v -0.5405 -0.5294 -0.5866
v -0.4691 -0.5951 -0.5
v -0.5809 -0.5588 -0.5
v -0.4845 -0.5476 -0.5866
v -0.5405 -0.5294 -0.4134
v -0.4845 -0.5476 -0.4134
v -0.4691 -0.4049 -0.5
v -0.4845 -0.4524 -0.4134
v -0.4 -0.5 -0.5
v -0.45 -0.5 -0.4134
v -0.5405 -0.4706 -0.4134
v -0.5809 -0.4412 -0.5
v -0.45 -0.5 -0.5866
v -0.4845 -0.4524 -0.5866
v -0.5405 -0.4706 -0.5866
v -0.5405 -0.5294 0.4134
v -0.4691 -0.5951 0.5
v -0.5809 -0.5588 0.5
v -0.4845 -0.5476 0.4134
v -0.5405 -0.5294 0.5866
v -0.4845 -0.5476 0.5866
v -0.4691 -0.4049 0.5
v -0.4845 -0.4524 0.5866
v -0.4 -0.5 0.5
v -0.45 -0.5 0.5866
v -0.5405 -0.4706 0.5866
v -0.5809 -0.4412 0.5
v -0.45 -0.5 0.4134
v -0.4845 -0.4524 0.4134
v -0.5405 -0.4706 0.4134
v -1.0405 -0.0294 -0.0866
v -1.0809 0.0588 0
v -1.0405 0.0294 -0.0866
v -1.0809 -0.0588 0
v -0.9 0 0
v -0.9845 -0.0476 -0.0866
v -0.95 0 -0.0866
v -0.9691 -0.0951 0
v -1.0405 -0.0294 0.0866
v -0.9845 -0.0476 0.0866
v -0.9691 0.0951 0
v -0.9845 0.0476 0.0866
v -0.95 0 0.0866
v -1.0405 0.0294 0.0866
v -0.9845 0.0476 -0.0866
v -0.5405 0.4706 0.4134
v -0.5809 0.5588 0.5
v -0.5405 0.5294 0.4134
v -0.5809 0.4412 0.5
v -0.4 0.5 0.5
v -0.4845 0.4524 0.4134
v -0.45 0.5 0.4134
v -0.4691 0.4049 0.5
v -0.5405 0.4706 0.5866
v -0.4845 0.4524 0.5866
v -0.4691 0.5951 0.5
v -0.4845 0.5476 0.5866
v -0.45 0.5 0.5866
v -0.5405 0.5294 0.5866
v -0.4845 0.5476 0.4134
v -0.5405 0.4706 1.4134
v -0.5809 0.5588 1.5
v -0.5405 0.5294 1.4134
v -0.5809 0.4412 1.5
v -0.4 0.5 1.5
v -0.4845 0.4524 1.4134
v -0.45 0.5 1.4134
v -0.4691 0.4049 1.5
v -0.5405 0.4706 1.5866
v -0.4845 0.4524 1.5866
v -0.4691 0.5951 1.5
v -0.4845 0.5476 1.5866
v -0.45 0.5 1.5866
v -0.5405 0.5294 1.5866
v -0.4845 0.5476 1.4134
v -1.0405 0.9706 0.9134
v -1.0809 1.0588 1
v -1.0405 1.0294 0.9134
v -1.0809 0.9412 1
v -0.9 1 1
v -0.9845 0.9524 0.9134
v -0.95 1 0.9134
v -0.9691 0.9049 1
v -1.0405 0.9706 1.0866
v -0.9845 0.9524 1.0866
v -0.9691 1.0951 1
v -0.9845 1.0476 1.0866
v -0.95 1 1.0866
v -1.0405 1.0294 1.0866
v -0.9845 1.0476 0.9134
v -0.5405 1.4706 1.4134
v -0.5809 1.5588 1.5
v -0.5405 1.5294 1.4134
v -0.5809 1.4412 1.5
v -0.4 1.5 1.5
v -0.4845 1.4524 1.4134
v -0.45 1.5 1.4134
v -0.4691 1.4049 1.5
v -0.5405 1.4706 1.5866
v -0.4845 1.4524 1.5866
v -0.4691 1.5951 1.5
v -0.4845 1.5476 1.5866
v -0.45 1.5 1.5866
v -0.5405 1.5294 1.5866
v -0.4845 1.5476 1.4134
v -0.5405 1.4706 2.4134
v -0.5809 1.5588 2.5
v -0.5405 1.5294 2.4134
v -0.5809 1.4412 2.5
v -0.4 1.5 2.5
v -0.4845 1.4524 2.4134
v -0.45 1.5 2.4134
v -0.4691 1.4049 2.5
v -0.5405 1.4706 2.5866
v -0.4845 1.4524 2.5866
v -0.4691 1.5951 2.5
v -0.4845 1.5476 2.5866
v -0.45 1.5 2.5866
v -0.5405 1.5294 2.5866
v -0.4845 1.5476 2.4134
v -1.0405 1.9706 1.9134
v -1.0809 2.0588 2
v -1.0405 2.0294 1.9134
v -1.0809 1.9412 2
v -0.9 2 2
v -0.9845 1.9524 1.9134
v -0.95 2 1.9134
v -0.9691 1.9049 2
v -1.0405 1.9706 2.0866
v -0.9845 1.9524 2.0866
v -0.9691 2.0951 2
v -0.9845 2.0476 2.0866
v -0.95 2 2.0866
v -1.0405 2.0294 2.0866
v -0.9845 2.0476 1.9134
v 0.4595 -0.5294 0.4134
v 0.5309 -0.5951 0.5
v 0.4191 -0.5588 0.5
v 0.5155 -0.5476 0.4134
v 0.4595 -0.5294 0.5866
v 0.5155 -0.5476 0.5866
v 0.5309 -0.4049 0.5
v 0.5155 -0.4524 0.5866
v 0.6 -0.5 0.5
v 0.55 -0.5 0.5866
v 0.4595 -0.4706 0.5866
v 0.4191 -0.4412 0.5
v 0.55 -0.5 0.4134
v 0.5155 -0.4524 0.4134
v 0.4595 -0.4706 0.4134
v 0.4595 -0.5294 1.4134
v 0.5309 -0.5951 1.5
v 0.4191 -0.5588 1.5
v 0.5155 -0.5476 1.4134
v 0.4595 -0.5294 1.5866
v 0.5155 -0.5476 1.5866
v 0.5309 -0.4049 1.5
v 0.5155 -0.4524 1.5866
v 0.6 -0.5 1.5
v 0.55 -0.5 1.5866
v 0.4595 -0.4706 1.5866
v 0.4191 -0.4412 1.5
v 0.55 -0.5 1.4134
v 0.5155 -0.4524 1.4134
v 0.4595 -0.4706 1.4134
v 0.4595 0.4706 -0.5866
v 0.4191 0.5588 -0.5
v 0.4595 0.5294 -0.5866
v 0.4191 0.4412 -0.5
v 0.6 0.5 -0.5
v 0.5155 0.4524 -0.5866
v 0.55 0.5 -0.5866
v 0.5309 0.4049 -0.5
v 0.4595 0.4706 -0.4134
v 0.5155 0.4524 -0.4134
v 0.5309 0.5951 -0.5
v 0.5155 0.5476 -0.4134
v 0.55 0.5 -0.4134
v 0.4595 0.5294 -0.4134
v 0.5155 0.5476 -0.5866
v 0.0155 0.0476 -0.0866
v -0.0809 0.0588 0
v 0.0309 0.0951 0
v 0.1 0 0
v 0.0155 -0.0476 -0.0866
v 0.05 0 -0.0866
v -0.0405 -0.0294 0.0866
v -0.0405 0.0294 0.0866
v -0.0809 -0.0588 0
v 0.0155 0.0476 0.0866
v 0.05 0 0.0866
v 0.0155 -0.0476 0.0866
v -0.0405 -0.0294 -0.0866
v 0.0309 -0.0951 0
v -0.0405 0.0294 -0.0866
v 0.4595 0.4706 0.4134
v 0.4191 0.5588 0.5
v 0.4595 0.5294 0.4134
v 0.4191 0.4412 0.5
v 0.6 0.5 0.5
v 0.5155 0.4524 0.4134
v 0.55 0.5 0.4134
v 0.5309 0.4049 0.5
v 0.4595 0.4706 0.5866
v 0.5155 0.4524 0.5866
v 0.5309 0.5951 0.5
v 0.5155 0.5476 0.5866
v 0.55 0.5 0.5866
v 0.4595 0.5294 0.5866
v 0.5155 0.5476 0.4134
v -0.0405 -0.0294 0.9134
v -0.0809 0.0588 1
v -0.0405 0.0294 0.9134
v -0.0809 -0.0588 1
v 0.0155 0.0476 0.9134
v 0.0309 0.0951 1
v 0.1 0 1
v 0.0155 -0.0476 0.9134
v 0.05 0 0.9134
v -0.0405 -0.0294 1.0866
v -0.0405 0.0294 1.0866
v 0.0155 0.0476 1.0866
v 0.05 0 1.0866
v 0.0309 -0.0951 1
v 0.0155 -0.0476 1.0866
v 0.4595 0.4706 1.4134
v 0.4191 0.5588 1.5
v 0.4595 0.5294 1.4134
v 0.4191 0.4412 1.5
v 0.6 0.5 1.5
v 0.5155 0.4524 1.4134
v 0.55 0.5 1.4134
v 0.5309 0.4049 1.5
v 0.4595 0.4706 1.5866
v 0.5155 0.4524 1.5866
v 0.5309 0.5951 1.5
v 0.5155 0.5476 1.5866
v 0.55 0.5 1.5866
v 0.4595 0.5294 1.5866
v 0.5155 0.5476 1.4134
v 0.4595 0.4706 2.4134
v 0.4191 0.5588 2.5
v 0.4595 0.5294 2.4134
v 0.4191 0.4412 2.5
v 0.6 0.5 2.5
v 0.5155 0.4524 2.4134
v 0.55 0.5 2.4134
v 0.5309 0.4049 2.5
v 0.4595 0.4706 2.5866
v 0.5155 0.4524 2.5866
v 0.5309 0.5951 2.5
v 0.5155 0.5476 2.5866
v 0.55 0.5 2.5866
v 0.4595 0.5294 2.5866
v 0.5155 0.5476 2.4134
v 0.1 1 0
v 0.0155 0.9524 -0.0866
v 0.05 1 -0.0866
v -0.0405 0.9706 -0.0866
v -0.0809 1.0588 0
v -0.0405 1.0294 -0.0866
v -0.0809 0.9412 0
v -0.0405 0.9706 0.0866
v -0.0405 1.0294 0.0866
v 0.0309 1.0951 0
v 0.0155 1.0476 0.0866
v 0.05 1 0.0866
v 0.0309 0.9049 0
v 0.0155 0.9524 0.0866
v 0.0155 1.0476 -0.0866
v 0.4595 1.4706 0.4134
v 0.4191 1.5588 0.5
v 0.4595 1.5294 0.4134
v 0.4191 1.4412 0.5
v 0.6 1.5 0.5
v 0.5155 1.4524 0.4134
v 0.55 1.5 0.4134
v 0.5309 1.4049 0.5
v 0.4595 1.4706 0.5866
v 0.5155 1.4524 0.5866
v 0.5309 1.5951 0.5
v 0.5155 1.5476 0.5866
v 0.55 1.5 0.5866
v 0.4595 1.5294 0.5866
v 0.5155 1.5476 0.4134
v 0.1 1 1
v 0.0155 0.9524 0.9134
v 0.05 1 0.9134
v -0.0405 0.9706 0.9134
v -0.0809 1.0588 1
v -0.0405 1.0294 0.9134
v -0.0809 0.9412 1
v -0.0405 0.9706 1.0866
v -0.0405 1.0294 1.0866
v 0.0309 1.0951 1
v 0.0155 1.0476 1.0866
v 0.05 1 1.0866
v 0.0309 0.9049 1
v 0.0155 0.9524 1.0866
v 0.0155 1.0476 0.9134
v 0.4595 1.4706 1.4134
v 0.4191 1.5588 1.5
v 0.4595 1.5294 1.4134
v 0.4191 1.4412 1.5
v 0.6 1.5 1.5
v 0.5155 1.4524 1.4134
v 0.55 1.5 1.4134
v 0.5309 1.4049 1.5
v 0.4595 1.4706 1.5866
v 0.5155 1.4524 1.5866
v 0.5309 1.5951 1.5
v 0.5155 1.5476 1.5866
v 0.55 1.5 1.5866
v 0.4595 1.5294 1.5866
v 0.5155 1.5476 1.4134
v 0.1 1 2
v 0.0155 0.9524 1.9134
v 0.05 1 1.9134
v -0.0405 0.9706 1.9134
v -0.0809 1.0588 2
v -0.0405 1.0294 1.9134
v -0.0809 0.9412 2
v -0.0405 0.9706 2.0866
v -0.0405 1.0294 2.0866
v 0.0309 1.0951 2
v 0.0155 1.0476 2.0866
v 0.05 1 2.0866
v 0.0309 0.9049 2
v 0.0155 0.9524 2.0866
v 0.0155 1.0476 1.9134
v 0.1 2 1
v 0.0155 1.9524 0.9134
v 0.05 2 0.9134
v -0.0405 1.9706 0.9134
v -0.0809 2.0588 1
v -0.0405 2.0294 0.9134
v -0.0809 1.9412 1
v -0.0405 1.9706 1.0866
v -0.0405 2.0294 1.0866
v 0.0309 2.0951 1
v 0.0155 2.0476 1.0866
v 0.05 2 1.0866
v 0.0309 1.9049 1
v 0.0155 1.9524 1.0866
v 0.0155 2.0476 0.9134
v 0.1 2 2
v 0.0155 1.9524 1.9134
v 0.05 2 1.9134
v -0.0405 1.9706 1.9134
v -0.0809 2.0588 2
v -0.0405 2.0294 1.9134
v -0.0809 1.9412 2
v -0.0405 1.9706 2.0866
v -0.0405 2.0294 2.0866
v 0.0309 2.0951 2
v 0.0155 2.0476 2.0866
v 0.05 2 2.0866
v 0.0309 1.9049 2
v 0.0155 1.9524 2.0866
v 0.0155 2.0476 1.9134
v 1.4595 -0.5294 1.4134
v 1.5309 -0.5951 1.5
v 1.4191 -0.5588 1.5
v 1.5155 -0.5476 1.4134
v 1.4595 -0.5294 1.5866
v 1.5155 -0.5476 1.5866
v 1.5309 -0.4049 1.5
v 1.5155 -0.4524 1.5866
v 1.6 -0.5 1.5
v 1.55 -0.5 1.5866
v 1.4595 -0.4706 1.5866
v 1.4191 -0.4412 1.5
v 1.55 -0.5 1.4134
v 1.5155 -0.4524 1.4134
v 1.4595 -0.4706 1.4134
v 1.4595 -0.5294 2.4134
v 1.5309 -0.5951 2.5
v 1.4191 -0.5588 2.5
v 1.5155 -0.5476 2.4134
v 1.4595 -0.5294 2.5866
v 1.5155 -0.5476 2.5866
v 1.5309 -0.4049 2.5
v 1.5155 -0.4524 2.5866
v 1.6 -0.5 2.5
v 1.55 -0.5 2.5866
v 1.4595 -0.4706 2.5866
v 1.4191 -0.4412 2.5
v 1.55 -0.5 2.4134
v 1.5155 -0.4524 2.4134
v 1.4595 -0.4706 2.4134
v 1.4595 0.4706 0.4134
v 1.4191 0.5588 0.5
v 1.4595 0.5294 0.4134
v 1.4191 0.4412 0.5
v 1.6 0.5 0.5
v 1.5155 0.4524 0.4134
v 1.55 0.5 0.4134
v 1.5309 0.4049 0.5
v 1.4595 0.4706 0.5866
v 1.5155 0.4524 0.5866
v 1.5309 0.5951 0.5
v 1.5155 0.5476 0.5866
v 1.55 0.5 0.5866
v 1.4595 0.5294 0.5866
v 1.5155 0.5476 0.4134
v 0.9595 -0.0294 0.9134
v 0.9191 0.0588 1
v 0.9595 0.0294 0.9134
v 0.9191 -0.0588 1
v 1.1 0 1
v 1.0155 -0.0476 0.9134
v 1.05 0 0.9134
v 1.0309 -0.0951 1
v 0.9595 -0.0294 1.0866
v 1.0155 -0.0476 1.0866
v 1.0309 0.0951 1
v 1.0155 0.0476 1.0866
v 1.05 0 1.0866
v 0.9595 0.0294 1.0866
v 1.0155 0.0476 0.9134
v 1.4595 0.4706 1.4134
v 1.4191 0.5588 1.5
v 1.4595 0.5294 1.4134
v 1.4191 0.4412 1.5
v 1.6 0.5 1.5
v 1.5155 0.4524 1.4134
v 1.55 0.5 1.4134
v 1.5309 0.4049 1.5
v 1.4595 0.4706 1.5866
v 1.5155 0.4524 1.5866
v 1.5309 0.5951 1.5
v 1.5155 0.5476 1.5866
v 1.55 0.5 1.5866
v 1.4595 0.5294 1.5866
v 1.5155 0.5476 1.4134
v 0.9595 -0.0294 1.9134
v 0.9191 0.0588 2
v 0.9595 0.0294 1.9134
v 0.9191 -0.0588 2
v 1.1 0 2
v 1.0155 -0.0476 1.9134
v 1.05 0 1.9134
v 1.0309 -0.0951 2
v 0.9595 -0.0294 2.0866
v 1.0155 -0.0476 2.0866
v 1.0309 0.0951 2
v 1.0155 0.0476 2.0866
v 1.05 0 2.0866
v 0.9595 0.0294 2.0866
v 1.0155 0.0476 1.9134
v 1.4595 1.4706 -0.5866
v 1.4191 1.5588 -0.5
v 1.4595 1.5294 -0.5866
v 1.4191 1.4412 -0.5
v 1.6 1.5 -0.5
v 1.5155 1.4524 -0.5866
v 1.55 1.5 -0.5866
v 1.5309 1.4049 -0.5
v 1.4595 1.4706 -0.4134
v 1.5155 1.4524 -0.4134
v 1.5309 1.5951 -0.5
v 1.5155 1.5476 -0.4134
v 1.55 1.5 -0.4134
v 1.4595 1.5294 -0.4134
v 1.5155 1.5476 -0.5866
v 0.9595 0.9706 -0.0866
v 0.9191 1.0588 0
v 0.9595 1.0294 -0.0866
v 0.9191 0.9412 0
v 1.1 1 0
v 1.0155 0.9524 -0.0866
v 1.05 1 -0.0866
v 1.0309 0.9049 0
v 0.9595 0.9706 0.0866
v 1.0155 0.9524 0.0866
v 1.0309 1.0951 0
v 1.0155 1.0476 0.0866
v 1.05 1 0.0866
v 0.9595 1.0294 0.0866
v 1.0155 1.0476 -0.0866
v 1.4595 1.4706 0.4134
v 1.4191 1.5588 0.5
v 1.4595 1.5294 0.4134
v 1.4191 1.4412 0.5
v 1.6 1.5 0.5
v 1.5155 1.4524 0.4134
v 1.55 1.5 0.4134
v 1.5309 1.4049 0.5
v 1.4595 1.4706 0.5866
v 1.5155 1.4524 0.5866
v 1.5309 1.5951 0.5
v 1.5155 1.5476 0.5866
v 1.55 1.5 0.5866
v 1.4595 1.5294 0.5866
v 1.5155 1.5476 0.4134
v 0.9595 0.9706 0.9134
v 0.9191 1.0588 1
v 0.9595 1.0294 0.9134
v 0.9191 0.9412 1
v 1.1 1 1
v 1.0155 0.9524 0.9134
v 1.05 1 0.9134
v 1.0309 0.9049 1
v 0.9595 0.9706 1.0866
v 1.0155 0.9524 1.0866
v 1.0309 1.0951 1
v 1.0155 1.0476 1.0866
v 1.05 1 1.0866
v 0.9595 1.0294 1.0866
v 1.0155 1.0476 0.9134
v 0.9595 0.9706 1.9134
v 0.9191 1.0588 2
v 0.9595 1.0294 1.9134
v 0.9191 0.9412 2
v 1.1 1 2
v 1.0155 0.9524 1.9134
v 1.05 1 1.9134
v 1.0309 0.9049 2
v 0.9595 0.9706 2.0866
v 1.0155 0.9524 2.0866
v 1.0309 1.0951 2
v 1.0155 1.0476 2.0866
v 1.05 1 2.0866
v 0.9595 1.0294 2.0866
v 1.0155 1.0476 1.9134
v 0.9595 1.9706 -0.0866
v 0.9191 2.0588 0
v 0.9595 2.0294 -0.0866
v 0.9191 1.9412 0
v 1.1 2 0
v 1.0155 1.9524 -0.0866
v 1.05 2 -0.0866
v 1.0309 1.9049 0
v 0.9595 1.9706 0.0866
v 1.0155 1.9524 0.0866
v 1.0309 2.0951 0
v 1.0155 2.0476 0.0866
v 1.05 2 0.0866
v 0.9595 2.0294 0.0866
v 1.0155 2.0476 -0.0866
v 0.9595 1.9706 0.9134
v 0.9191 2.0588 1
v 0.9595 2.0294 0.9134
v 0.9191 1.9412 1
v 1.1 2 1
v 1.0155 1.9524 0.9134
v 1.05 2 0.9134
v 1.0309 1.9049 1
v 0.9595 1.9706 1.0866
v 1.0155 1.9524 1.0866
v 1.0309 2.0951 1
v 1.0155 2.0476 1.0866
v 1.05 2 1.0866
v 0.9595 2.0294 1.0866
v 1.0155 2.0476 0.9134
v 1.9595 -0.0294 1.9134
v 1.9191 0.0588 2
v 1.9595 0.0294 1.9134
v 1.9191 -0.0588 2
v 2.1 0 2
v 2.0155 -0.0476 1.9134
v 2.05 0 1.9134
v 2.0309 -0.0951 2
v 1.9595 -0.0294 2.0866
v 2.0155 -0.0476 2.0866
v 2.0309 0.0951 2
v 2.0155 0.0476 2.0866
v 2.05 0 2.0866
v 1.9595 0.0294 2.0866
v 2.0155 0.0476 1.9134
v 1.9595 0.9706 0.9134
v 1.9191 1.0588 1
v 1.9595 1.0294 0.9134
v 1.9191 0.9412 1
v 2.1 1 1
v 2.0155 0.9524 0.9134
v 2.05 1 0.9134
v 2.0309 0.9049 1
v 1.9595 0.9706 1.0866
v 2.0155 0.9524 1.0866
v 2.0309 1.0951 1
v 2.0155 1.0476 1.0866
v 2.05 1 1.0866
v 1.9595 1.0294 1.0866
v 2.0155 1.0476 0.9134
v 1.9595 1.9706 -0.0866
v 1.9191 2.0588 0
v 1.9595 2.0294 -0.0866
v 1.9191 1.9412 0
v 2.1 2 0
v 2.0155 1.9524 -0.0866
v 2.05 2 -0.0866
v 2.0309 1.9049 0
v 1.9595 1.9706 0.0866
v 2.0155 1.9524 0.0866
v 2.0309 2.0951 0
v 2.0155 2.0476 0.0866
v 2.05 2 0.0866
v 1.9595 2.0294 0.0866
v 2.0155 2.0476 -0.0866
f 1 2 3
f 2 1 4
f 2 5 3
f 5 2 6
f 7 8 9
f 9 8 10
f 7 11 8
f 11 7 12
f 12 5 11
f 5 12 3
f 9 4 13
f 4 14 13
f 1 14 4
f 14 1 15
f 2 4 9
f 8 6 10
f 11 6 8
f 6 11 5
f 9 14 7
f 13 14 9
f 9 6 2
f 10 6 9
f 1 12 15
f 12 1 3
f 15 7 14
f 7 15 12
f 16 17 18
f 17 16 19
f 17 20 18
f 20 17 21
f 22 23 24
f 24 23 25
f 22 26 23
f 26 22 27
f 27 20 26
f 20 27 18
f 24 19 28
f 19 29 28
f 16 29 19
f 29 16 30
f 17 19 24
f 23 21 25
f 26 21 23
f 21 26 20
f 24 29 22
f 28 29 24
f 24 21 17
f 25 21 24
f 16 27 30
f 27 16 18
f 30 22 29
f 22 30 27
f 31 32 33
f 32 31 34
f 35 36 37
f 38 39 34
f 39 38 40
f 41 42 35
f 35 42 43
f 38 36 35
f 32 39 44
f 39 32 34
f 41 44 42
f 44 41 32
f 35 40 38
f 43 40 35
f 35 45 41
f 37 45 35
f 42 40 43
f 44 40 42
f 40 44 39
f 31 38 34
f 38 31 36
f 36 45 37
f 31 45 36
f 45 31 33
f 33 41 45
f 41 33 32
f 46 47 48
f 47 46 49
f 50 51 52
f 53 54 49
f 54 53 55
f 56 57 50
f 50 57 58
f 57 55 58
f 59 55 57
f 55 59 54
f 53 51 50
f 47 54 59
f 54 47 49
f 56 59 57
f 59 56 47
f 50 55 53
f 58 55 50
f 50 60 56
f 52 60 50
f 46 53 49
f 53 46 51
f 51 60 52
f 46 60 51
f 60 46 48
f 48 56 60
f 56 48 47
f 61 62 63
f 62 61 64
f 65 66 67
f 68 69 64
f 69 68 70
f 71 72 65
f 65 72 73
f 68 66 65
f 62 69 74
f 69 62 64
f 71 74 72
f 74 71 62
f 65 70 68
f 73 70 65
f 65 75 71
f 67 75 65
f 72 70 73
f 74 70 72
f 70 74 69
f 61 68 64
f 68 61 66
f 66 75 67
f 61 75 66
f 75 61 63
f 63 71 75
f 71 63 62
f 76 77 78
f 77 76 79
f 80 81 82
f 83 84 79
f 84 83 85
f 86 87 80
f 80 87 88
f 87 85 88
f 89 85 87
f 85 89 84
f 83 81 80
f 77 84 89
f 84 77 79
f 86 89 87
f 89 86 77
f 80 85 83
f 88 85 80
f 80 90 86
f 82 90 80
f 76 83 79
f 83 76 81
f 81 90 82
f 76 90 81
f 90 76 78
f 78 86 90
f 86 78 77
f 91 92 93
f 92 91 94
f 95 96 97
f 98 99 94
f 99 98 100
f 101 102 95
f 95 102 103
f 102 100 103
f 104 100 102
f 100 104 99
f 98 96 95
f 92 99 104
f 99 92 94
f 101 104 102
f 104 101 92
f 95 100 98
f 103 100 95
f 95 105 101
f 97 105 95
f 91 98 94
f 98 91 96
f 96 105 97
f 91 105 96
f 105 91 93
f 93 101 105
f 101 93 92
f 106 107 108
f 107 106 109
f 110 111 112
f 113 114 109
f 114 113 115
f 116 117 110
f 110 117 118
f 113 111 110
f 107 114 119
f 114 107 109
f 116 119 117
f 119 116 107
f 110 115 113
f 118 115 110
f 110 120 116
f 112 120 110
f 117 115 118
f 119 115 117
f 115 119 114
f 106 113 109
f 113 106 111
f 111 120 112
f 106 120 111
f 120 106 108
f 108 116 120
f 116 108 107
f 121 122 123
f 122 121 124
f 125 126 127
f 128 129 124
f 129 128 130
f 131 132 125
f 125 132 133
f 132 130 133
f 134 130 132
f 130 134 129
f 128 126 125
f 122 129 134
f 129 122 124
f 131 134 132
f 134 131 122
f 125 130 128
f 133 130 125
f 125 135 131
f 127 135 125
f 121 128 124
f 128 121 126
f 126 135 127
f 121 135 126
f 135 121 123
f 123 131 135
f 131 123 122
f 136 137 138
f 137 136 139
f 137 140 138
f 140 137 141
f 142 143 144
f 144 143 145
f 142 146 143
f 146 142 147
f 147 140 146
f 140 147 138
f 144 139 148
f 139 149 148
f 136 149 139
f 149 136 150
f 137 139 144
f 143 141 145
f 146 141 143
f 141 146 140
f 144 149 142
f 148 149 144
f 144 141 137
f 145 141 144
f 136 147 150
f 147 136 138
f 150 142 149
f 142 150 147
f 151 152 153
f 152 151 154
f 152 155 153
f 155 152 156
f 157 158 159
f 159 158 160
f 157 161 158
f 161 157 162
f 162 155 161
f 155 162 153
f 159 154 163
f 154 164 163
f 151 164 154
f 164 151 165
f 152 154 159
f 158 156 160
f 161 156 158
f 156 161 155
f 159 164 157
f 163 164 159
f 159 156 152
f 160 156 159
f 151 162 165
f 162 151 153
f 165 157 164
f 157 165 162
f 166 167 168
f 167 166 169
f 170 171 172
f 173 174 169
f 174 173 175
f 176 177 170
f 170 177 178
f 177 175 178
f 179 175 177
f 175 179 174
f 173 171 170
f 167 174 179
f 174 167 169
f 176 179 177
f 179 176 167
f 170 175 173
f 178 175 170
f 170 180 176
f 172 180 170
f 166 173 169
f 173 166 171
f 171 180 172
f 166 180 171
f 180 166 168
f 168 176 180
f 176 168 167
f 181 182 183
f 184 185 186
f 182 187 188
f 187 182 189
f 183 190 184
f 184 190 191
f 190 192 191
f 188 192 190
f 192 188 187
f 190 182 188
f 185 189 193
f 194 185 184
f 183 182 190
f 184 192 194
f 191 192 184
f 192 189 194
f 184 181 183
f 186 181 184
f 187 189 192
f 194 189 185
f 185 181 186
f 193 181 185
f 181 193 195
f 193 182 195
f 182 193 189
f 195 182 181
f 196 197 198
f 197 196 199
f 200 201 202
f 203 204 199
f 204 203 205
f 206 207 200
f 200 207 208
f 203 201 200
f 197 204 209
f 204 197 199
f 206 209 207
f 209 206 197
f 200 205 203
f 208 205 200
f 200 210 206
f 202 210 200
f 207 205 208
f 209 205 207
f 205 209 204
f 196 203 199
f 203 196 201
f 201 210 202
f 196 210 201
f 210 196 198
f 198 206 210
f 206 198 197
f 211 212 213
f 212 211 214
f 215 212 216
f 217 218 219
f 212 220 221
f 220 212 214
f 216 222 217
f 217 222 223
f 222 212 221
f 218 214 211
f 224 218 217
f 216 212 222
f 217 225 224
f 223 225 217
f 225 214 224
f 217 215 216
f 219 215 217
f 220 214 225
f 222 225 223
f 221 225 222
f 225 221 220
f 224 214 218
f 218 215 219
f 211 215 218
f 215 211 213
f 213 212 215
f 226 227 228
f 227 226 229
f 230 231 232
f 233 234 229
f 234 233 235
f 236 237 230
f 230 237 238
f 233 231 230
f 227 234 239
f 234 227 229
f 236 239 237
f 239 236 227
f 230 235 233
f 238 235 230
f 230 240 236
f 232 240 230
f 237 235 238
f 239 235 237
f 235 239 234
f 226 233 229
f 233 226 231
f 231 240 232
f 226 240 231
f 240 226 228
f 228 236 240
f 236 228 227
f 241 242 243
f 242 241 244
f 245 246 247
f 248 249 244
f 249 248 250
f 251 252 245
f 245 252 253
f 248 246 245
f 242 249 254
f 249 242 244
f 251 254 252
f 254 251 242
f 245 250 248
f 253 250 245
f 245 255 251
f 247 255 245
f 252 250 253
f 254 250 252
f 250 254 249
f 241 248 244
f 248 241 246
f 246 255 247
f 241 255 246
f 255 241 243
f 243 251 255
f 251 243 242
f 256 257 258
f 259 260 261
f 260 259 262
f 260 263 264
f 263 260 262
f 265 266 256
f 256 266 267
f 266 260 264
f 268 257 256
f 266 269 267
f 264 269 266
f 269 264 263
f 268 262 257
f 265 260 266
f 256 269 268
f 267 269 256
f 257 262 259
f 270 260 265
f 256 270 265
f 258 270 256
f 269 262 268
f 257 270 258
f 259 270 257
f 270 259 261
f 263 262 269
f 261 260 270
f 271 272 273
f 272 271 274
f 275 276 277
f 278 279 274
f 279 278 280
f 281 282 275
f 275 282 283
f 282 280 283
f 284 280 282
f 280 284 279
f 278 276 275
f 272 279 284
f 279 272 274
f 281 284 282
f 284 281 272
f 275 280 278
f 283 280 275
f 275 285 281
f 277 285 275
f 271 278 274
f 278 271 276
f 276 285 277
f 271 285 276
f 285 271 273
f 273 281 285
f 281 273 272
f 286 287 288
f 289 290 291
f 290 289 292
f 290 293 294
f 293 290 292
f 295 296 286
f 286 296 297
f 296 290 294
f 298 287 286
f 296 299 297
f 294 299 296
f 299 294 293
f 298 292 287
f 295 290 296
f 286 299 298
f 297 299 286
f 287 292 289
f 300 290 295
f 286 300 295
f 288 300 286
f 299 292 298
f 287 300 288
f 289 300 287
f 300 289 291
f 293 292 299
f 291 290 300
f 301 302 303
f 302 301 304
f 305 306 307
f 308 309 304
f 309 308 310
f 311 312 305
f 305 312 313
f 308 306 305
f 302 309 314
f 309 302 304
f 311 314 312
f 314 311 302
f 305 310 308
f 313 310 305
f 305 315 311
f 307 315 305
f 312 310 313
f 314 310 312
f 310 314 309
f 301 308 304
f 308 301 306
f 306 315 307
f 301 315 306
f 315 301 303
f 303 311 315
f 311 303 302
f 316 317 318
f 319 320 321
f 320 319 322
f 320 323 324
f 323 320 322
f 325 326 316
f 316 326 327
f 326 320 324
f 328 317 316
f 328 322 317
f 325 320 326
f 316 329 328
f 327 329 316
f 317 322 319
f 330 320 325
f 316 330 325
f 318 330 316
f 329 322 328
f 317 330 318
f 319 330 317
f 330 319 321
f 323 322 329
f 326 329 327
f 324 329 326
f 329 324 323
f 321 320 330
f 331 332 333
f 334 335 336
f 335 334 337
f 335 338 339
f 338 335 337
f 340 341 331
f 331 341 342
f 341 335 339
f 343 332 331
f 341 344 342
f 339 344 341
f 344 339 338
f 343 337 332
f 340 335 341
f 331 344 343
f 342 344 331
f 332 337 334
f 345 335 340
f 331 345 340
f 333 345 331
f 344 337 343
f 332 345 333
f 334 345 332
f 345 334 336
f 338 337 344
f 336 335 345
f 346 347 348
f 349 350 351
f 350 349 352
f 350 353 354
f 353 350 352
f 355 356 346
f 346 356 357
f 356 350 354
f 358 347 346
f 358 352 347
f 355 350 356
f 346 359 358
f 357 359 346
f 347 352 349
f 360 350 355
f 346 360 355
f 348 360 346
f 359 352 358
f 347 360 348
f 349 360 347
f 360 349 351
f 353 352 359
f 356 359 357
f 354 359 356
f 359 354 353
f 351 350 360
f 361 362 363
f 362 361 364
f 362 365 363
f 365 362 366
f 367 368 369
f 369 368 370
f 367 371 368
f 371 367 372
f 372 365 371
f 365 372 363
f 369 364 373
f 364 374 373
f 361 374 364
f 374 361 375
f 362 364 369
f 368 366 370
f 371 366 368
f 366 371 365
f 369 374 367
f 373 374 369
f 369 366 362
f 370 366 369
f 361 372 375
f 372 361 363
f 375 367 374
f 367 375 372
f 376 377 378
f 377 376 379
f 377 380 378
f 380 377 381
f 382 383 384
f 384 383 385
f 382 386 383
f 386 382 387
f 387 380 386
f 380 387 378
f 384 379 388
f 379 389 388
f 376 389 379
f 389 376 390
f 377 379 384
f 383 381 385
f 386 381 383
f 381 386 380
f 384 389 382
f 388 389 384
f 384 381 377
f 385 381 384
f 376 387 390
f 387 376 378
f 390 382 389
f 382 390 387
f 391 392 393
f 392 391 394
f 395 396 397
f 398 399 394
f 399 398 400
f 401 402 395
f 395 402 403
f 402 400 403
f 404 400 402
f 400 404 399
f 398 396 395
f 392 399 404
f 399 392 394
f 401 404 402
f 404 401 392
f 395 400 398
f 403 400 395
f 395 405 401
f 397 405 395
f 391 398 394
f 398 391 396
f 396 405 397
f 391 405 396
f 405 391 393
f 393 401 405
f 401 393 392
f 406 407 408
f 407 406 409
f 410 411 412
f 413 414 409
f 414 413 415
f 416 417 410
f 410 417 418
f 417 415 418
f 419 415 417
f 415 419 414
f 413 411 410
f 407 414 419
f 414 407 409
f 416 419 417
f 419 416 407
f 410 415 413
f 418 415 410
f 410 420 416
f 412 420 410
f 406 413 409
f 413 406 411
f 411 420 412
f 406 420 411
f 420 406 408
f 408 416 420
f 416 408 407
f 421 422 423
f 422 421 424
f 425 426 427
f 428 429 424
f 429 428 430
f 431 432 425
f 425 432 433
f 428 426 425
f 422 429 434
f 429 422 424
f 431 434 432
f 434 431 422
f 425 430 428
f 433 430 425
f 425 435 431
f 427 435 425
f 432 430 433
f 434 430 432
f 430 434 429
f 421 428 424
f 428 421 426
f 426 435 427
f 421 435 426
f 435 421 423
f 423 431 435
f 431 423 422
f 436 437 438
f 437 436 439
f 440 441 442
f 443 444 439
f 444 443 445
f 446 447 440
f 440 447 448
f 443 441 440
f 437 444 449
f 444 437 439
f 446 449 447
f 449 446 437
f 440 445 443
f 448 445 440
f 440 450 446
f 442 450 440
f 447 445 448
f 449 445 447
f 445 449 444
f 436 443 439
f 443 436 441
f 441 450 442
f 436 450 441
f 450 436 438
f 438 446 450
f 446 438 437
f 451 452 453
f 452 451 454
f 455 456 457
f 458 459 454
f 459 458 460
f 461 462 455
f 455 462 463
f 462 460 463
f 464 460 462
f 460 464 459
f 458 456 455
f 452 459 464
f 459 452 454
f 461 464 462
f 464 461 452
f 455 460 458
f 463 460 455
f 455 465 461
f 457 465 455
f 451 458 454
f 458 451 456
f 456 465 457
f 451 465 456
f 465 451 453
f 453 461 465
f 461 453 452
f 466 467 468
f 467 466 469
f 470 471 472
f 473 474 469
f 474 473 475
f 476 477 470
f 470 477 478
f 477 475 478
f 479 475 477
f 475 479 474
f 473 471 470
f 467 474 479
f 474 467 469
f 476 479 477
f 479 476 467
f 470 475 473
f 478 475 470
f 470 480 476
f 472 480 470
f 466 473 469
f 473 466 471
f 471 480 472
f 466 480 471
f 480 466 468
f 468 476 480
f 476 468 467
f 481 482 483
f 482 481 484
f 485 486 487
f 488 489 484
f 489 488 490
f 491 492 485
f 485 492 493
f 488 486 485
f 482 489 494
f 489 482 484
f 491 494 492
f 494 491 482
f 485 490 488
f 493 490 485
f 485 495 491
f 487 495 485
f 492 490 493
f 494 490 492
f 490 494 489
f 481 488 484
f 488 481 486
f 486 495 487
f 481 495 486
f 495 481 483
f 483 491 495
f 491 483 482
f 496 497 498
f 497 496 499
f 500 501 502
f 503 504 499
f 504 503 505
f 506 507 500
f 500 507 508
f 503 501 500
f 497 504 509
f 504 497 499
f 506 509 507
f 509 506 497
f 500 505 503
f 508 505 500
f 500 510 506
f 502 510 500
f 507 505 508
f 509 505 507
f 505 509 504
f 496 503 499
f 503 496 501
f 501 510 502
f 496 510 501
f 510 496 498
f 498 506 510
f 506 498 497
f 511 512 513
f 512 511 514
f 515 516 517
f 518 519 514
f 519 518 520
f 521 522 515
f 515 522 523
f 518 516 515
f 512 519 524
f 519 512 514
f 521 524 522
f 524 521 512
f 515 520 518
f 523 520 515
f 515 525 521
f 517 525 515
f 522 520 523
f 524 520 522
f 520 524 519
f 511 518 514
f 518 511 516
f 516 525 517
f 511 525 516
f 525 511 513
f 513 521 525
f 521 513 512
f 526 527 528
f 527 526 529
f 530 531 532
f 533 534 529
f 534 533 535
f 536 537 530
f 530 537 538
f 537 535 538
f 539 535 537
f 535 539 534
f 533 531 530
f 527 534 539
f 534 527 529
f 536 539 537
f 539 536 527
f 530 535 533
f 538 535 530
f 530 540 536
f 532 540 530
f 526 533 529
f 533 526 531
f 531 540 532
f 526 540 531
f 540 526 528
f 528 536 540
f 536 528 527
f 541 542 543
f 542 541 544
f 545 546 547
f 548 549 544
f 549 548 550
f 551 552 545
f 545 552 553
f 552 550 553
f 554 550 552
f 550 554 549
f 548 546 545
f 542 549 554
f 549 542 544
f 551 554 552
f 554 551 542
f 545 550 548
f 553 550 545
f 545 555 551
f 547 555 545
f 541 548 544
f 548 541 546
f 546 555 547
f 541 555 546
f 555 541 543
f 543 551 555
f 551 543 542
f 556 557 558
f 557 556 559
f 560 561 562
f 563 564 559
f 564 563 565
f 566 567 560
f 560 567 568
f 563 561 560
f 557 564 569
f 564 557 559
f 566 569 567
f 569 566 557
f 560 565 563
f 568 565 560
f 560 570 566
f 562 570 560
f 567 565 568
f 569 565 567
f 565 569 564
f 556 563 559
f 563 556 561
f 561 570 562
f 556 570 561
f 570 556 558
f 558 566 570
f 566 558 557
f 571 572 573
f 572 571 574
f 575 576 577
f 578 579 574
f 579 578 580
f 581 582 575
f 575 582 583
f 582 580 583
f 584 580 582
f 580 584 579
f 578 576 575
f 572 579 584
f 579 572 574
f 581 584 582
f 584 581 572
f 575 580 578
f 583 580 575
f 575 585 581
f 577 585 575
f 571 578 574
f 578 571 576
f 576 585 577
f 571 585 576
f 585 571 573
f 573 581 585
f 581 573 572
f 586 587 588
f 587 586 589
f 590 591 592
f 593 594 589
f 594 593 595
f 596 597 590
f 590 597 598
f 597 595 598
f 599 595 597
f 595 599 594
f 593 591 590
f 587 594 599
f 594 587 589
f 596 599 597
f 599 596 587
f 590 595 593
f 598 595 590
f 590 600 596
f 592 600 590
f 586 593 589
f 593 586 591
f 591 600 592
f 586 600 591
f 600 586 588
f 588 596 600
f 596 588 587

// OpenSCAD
// file: 3d_tetrahedres.scad
use <lattice.scad>;

// Check if a vertex is adjacent to the central layer (that sets the size of processor).
// n as n_code in article (starts at 1).
function central_layer(x, z, n) = ((x+z == n-2) || (x+z == n-1)) ? true : false;

// Elementary tetrahedron as described in Equation (18) of arXiv:1311.0879.
// x, y, z : coordinates of vector x in arXiv:1311.0879
// s : +- 1
// permut : integer between 0 and 5 (included) that describe the permutation (a, b, c) :
//          0 : (a, b, c) = (i, j, k)
//          1 : (a, b, c) = (i, k, j)
//          2 : (a, b, c) = (j, i, k)
//          3 : (a, b, c) = (j, k, i)
//          4 : (a, b, c) = (k, i, j)
//          5 : (a, b, c) = (j, j, i)
// n : we keep only tetrahedron included in the code structure indexed by n.
//     n is as in Equation (19) of arXiv:1311.0879 (starts at 1).
//     use -1 for no filter
 module tetraedre (x, y, z, s, permut, n) {
     // if (permut==0) {xa=1; ya=0; za=0; xb=0; yb=1; zb=0; xc=0; yc=0; zc=1;}
     // if (permut==1) {xa=1; ya=0; za=0; xb=0; yb=0; zb=1; xc=0; yc=1; zc=0;}
     // if (permut==2) {xa=0; ya=1; za=0; xb=1; yb=0; zb=0; xc=0; yc=0; zc=1;}
     // if (permut==3) {xa=0; ya=1; za=0; xb=0; yb=0; zb=1; xc=1; yc=0; zc=0;}
     // if (permut==4) {xa=0; ya=0; za=1; xb=1; yb=0; zb=0; xc=0; yc=1; zc=0;}
     // if (permut==5) {xa=0; ya=0; za=1; xb=0; yb=1; zb=0; xc=1; yc=0; zc=0;}
     xa = permut==0 || permut==1 ? 1 : 0;
     ya = permut==2 || permut==3 ? 1 : 0;
     za = permut==4 || permut==5 ? 1 : 0;
     xb = permut==2 || permut==4 ? 1 : 0;
     yb = permut==0 || permut==5 ? 1 : 0;
     zb = permut==1 || permut==3 ? 1 : 0;
     xc = permut==3 || permut==5 ? 1 : 0;
     yc = permut==1 || permut==4 ? 1 : 0;
     zc = permut==0 || permut==2 ? 1 : 0;

     // Coordinates of vertices of the tetrahedron.
     x1=x; y1=y; z1=z;                                               // x
     x2=x+xa; y2=y+ya; z2=z+za;                                      // x + a
     x3=x+(xa+s*xb+xc)/2; y3=y+(ya+s*yb+yc)/2; z3=z+(za+s*zb+zc)/2;  // x + (a+sb+c)/2
     x4=x+(xa+s*xb-xc)/2; y4=y+(ya+s*yb-yc)/2; z4=z+(za+s*zb-zc)/2;  // x + (a+sb-c)/2

     if (n == -1 || (
         filtre(x1, y1, z1, n)
         && filtre(x2, y2, z2, n)
         && filtre(x3, y3, z3, n)
         && filtre(x4, y4, z4, n)
     )) {
         // echo(x, y, z, s, permut, n);
         if (central_layer(x1, z1, n)
             && central_layer(x2, z2, n)
             && central_layer(x3, z3, n)
             && central_layer(x4, z4, n))
            {
             echo("One central tetraedron");
             color("red")
             polyhedron(
                 points=[[x1,y1,z1], [x2,y2,z2], [x3,y3,z3], [x4,y4,z4]],
                 faces=[[0,1,2], [0,1,3], [0,2,3], [1,3,2]]
                );
            }
         else {
             polyhedron(
                 points=[[x1,y1,z1], [x2,y2,z2], [x3,y3,z3], [x4,y4,z4]],
                 faces=[[0,1,2], [0,1,3], [0,2,3], [1,3,2]]
                );
            }
        }
    }


n = 3;
grille(n);

for (x = [-1:n-1]) {
        for (y = [-1:n-1]) {
            for (z = [-1:n-1]) {
                for (s=[-1:2:1]) {
                    for (permut = [0:5]) {
                        tetraedre(x, y, z, s, permut, n);
                    }
                }
            }
        }
    }
// file: lattice.scad
// Centered cubic grid, as presented in Equation (18) from arXiv:1311.0879


//  Uncut centered cubic grid.
module maille(nb) {
    // Diameter of small balls
    rad = 0.1;
    for (x = [0:nb]) {
        for (y = [0:nb]) {
            for (z = [0:nb]) {
                type = abs((x + y + z) % 2);  // Correspond to color
                x2 = x+0.5; y2 = y+0.5; z2 = z+0.5;
                if (type == 0) {
                        color("red") translate([x, y, z]) sphere(rad);
                        color("blue") translate([x2, y2, z2]) sphere(rad);
                        }
                if (type == 1) {
                    color("green") translate([x, y, z]) sphere(rad);
                    color("yellow") translate([x2, y2, z2]) sphere(rad);
                    }
                }
            }
        }
    }



// Check Equation (19) of arXiv:1311.0879 (n stars at 1).
function filtre(x, y, z, n) = ((x+y+z <= 0 + 2*(n-1))
                               && (x-y-z <= 1/2)
                               && (-x+y-z <= 1)
                               && (-x-y+z <= 3/2)) ? true : false;


// Grid as presented in Equations (18) and (19) of arXiv:1311.0879.
// n : number n in Equation (19): index in the code family, starts at 1.
module grille(n) {
    // Diameter of small balls
    rad = 0.1;
    for (x = [-1:n-1]) {
        for (y = [-1:n-1]) {
            for (z = [-1:n-1]) {
                type = abs((x + y + z) % 2);  // Correspond to color
                if (filtre(x, y, z, n)) {
                    if (type == 0) {
                        color("red") translate([x, y, z]) sphere(rad);
                        }
                    if (type == 1) {
                        color("green") translate([x, y, z]) sphere(rad);
                        }
                    }
                x2 = x+0.5; y2 = y+0.5; z2 = z+0.5;
                if (filtre(x2, y2, z2, n)) {
                    if (type == 0) {
                        color("blue") translate([x2, y2, z2]) sphere(rad);
                        }
                    if (type == 1) {
                        color("yellow") translate([x2, y2, z2]) sphere(rad);
                        }
                    }
                }
            }
        }
    }

//maille(2);
grille(2);
// main file
use <lattice.scad>;
use <3d_tetrahedres.scad>;

// 1st layer : 19 qubits
color("Chocolate") tetraedre(1, 0, 2, -1, 0, 3);
color("Chocolate") tetraedre(1, 0, 2, -1, 1, 3);
color("Chocolate") tetraedre(1, 1, 1, -1, 0, 3);
color("Chocolate") tetraedre(1, 1, 1, -1, 1, 3);
color("Chocolate") tetraedre(1, 2, 0, -1, 0, 3);
color("Chocolate") tetraedre(-1, 2, 2, -1, 0, 3);
color("Chocolate") tetraedre(1, 0, 2, -1, 3, 3);
color("Chocolate") tetraedre(1, 1, 1, -1, 3, 3);
color("Chocolate") tetraedre(1, 1, 1, -1, 5, 3);
color("Chocolate") tetraedre(1, 2, 0, -1, 5, 3);
color("Chocolate") tetraedre(1, 0, 2, -1, 2, 3);
color("Chocolate") tetraedre(1, 1, 1, -1, 2, 3);
color("Chocolate") tetraedre(1, 1, 1, -1, 4, 3);
color("Chocolate") tetraedre(0, 1, 2, -1, 0, 3);
color("Chocolate") tetraedre(0, 1, 2, -1, 1, 3);
color("Chocolate") tetraedre(0, 2, 1, -1, 0, 3);
color("Chocolate") tetraedre(0, 1, 2, -1, 3, 3);
color("Chocolate") tetraedre(0, 2, 1, -1, 5, 3);
color("Chocolate") tetraedre(0, 1, 2, -1, 2, 3);

// 2nd layer : 14 qubits
color("SpringGreen") tetraedre(1, 0, 1, 1, 3, 3);
color("SpringGreen") tetraedre(1, 0, 1, 1, 5, 3);
color("SpringGreen") tetraedre(1, 1, 0, 1, 3, 3);
color("SpringGreen") tetraedre(1, 1, 0, 1, 5, 3);
color("SpringGreen") tetraedre(0, 1, 1, 1, 0, 3);
color("SpringGreen") tetraedre(0, 1, 1, 1, 1, 3);
color("SpringGreen") tetraedre(0, 1, 1, 1, 2, 3);
color("SpringGreen") tetraedre(0, 1, 1, 1, 4, 3);
color("SpringGreen") tetraedre(0, 1, 1, 1, 3, 3);
color("SpringGreen") tetraedre(0, 1, 1, 1, 5, 3);
color("SpringGreen") tetraedre(1, 0, 1, 1, 2, 3);
color("SpringGreen") tetraedre(1, 0, 1, 1, 4, 3);
color("SpringGreen") tetraedre(1, 1, 0, 1, 2, 3);
color("SpringGreen") tetraedre(1, 1, 0, 1, 4, 3);

// 3rd layer : 10 qubits
color("HotPink") tetraedre(0, 1, 1, -1, 5, 3);
color("HotPink") tetraedre(0, 1, 1, -1, 0, 3);
color("HotPink") tetraedre(0, 1, 1, -1, 1, 3);
color("HotPink") tetraedre(1, 0, 1, -1, 3, 3);
color("HotPink") tetraedre(1, 0, 1, -1, 5, 3);
color("HotPink") tetraedre(1, 1, 0, -1, 5, 3);
color("HotPink") tetraedre(1, 0, 1, -1, 2, 3);
color("HotPink") tetraedre(1, 0, 1, -1, 4, 3);
color("HotPink") tetraedre(1, 1, 0, -1, 4, 3);
color("HotPink") tetraedre(0, 1, 1, -1, 4, 3);

// 4th layer : 7 qubits
color("Navy") tetraedre(0, 0, 1, 1, 3, 3);
color("Navy") tetraedre(-1, 1, 1, 1, 1, 3);
color("Navy") tetraedre(0, 0, 1, 1, 0, 3);
color("Navy") tetraedre(0, 0, 1, 1, 1, 3);
color("Navy") tetraedre(0, 1, 0, 1, 1, 3);
color("Navy") tetraedre(0, 0, 1, 1, 2, 3);
color("Navy") tetraedre(0, 1, 0, 1, 4, 3);


// ------------------------------------------------------
// From here we can see the n-1 structure

// 5th layer : 7 qubits
color("Orange") tetraedre(-1, 1, 1, -1, 0, 3);
color("Orange") tetraedre(0, 0, 1, -1, 0, 3);
color("Orange") tetraedre(0, 0, 1, -1, 1, 3);
color("Orange") tetraedre(0, 1, 0, -1, 0, 3);
// To see and edge neighboring 3 layers,
// remove the two following tetrahedrons
color("Orange") tetraedre(0, 0, 1, -1, 3, 3);
color("Orange") tetraedre(0, 1, 0, -1, 5, 3);
color("Orange") tetraedre(0, 0, 1, -1, 2, 3);

// 6th layer : 4 qubits
color("cyan") tetraedre(0, 0, 0, 1, 2, 3);
color("cyan") tetraedre(0, 0, 0, 1, 4, 3);
color("cyan") tetraedre(0, 0, 0, 1, 3, 3);
color("cyan") tetraedre(0, 0, 0, 1, 5, 3);

// 7th layer : 2 qubits
color("magenta") tetraedre(0, 0, 0, -1, 5, 3);
color("magenta") tetraedre(0, 0, 0, -1, 4, 3);

// 8th layer : 1 qubit
color("Chartreuse") tetraedre(-1, 0, 0, 1, 1, 3);

// 9th layer : 1 qubit
color("black") tetraedre(-1, 0, 0, -1, 0, 3);


grille(3);
